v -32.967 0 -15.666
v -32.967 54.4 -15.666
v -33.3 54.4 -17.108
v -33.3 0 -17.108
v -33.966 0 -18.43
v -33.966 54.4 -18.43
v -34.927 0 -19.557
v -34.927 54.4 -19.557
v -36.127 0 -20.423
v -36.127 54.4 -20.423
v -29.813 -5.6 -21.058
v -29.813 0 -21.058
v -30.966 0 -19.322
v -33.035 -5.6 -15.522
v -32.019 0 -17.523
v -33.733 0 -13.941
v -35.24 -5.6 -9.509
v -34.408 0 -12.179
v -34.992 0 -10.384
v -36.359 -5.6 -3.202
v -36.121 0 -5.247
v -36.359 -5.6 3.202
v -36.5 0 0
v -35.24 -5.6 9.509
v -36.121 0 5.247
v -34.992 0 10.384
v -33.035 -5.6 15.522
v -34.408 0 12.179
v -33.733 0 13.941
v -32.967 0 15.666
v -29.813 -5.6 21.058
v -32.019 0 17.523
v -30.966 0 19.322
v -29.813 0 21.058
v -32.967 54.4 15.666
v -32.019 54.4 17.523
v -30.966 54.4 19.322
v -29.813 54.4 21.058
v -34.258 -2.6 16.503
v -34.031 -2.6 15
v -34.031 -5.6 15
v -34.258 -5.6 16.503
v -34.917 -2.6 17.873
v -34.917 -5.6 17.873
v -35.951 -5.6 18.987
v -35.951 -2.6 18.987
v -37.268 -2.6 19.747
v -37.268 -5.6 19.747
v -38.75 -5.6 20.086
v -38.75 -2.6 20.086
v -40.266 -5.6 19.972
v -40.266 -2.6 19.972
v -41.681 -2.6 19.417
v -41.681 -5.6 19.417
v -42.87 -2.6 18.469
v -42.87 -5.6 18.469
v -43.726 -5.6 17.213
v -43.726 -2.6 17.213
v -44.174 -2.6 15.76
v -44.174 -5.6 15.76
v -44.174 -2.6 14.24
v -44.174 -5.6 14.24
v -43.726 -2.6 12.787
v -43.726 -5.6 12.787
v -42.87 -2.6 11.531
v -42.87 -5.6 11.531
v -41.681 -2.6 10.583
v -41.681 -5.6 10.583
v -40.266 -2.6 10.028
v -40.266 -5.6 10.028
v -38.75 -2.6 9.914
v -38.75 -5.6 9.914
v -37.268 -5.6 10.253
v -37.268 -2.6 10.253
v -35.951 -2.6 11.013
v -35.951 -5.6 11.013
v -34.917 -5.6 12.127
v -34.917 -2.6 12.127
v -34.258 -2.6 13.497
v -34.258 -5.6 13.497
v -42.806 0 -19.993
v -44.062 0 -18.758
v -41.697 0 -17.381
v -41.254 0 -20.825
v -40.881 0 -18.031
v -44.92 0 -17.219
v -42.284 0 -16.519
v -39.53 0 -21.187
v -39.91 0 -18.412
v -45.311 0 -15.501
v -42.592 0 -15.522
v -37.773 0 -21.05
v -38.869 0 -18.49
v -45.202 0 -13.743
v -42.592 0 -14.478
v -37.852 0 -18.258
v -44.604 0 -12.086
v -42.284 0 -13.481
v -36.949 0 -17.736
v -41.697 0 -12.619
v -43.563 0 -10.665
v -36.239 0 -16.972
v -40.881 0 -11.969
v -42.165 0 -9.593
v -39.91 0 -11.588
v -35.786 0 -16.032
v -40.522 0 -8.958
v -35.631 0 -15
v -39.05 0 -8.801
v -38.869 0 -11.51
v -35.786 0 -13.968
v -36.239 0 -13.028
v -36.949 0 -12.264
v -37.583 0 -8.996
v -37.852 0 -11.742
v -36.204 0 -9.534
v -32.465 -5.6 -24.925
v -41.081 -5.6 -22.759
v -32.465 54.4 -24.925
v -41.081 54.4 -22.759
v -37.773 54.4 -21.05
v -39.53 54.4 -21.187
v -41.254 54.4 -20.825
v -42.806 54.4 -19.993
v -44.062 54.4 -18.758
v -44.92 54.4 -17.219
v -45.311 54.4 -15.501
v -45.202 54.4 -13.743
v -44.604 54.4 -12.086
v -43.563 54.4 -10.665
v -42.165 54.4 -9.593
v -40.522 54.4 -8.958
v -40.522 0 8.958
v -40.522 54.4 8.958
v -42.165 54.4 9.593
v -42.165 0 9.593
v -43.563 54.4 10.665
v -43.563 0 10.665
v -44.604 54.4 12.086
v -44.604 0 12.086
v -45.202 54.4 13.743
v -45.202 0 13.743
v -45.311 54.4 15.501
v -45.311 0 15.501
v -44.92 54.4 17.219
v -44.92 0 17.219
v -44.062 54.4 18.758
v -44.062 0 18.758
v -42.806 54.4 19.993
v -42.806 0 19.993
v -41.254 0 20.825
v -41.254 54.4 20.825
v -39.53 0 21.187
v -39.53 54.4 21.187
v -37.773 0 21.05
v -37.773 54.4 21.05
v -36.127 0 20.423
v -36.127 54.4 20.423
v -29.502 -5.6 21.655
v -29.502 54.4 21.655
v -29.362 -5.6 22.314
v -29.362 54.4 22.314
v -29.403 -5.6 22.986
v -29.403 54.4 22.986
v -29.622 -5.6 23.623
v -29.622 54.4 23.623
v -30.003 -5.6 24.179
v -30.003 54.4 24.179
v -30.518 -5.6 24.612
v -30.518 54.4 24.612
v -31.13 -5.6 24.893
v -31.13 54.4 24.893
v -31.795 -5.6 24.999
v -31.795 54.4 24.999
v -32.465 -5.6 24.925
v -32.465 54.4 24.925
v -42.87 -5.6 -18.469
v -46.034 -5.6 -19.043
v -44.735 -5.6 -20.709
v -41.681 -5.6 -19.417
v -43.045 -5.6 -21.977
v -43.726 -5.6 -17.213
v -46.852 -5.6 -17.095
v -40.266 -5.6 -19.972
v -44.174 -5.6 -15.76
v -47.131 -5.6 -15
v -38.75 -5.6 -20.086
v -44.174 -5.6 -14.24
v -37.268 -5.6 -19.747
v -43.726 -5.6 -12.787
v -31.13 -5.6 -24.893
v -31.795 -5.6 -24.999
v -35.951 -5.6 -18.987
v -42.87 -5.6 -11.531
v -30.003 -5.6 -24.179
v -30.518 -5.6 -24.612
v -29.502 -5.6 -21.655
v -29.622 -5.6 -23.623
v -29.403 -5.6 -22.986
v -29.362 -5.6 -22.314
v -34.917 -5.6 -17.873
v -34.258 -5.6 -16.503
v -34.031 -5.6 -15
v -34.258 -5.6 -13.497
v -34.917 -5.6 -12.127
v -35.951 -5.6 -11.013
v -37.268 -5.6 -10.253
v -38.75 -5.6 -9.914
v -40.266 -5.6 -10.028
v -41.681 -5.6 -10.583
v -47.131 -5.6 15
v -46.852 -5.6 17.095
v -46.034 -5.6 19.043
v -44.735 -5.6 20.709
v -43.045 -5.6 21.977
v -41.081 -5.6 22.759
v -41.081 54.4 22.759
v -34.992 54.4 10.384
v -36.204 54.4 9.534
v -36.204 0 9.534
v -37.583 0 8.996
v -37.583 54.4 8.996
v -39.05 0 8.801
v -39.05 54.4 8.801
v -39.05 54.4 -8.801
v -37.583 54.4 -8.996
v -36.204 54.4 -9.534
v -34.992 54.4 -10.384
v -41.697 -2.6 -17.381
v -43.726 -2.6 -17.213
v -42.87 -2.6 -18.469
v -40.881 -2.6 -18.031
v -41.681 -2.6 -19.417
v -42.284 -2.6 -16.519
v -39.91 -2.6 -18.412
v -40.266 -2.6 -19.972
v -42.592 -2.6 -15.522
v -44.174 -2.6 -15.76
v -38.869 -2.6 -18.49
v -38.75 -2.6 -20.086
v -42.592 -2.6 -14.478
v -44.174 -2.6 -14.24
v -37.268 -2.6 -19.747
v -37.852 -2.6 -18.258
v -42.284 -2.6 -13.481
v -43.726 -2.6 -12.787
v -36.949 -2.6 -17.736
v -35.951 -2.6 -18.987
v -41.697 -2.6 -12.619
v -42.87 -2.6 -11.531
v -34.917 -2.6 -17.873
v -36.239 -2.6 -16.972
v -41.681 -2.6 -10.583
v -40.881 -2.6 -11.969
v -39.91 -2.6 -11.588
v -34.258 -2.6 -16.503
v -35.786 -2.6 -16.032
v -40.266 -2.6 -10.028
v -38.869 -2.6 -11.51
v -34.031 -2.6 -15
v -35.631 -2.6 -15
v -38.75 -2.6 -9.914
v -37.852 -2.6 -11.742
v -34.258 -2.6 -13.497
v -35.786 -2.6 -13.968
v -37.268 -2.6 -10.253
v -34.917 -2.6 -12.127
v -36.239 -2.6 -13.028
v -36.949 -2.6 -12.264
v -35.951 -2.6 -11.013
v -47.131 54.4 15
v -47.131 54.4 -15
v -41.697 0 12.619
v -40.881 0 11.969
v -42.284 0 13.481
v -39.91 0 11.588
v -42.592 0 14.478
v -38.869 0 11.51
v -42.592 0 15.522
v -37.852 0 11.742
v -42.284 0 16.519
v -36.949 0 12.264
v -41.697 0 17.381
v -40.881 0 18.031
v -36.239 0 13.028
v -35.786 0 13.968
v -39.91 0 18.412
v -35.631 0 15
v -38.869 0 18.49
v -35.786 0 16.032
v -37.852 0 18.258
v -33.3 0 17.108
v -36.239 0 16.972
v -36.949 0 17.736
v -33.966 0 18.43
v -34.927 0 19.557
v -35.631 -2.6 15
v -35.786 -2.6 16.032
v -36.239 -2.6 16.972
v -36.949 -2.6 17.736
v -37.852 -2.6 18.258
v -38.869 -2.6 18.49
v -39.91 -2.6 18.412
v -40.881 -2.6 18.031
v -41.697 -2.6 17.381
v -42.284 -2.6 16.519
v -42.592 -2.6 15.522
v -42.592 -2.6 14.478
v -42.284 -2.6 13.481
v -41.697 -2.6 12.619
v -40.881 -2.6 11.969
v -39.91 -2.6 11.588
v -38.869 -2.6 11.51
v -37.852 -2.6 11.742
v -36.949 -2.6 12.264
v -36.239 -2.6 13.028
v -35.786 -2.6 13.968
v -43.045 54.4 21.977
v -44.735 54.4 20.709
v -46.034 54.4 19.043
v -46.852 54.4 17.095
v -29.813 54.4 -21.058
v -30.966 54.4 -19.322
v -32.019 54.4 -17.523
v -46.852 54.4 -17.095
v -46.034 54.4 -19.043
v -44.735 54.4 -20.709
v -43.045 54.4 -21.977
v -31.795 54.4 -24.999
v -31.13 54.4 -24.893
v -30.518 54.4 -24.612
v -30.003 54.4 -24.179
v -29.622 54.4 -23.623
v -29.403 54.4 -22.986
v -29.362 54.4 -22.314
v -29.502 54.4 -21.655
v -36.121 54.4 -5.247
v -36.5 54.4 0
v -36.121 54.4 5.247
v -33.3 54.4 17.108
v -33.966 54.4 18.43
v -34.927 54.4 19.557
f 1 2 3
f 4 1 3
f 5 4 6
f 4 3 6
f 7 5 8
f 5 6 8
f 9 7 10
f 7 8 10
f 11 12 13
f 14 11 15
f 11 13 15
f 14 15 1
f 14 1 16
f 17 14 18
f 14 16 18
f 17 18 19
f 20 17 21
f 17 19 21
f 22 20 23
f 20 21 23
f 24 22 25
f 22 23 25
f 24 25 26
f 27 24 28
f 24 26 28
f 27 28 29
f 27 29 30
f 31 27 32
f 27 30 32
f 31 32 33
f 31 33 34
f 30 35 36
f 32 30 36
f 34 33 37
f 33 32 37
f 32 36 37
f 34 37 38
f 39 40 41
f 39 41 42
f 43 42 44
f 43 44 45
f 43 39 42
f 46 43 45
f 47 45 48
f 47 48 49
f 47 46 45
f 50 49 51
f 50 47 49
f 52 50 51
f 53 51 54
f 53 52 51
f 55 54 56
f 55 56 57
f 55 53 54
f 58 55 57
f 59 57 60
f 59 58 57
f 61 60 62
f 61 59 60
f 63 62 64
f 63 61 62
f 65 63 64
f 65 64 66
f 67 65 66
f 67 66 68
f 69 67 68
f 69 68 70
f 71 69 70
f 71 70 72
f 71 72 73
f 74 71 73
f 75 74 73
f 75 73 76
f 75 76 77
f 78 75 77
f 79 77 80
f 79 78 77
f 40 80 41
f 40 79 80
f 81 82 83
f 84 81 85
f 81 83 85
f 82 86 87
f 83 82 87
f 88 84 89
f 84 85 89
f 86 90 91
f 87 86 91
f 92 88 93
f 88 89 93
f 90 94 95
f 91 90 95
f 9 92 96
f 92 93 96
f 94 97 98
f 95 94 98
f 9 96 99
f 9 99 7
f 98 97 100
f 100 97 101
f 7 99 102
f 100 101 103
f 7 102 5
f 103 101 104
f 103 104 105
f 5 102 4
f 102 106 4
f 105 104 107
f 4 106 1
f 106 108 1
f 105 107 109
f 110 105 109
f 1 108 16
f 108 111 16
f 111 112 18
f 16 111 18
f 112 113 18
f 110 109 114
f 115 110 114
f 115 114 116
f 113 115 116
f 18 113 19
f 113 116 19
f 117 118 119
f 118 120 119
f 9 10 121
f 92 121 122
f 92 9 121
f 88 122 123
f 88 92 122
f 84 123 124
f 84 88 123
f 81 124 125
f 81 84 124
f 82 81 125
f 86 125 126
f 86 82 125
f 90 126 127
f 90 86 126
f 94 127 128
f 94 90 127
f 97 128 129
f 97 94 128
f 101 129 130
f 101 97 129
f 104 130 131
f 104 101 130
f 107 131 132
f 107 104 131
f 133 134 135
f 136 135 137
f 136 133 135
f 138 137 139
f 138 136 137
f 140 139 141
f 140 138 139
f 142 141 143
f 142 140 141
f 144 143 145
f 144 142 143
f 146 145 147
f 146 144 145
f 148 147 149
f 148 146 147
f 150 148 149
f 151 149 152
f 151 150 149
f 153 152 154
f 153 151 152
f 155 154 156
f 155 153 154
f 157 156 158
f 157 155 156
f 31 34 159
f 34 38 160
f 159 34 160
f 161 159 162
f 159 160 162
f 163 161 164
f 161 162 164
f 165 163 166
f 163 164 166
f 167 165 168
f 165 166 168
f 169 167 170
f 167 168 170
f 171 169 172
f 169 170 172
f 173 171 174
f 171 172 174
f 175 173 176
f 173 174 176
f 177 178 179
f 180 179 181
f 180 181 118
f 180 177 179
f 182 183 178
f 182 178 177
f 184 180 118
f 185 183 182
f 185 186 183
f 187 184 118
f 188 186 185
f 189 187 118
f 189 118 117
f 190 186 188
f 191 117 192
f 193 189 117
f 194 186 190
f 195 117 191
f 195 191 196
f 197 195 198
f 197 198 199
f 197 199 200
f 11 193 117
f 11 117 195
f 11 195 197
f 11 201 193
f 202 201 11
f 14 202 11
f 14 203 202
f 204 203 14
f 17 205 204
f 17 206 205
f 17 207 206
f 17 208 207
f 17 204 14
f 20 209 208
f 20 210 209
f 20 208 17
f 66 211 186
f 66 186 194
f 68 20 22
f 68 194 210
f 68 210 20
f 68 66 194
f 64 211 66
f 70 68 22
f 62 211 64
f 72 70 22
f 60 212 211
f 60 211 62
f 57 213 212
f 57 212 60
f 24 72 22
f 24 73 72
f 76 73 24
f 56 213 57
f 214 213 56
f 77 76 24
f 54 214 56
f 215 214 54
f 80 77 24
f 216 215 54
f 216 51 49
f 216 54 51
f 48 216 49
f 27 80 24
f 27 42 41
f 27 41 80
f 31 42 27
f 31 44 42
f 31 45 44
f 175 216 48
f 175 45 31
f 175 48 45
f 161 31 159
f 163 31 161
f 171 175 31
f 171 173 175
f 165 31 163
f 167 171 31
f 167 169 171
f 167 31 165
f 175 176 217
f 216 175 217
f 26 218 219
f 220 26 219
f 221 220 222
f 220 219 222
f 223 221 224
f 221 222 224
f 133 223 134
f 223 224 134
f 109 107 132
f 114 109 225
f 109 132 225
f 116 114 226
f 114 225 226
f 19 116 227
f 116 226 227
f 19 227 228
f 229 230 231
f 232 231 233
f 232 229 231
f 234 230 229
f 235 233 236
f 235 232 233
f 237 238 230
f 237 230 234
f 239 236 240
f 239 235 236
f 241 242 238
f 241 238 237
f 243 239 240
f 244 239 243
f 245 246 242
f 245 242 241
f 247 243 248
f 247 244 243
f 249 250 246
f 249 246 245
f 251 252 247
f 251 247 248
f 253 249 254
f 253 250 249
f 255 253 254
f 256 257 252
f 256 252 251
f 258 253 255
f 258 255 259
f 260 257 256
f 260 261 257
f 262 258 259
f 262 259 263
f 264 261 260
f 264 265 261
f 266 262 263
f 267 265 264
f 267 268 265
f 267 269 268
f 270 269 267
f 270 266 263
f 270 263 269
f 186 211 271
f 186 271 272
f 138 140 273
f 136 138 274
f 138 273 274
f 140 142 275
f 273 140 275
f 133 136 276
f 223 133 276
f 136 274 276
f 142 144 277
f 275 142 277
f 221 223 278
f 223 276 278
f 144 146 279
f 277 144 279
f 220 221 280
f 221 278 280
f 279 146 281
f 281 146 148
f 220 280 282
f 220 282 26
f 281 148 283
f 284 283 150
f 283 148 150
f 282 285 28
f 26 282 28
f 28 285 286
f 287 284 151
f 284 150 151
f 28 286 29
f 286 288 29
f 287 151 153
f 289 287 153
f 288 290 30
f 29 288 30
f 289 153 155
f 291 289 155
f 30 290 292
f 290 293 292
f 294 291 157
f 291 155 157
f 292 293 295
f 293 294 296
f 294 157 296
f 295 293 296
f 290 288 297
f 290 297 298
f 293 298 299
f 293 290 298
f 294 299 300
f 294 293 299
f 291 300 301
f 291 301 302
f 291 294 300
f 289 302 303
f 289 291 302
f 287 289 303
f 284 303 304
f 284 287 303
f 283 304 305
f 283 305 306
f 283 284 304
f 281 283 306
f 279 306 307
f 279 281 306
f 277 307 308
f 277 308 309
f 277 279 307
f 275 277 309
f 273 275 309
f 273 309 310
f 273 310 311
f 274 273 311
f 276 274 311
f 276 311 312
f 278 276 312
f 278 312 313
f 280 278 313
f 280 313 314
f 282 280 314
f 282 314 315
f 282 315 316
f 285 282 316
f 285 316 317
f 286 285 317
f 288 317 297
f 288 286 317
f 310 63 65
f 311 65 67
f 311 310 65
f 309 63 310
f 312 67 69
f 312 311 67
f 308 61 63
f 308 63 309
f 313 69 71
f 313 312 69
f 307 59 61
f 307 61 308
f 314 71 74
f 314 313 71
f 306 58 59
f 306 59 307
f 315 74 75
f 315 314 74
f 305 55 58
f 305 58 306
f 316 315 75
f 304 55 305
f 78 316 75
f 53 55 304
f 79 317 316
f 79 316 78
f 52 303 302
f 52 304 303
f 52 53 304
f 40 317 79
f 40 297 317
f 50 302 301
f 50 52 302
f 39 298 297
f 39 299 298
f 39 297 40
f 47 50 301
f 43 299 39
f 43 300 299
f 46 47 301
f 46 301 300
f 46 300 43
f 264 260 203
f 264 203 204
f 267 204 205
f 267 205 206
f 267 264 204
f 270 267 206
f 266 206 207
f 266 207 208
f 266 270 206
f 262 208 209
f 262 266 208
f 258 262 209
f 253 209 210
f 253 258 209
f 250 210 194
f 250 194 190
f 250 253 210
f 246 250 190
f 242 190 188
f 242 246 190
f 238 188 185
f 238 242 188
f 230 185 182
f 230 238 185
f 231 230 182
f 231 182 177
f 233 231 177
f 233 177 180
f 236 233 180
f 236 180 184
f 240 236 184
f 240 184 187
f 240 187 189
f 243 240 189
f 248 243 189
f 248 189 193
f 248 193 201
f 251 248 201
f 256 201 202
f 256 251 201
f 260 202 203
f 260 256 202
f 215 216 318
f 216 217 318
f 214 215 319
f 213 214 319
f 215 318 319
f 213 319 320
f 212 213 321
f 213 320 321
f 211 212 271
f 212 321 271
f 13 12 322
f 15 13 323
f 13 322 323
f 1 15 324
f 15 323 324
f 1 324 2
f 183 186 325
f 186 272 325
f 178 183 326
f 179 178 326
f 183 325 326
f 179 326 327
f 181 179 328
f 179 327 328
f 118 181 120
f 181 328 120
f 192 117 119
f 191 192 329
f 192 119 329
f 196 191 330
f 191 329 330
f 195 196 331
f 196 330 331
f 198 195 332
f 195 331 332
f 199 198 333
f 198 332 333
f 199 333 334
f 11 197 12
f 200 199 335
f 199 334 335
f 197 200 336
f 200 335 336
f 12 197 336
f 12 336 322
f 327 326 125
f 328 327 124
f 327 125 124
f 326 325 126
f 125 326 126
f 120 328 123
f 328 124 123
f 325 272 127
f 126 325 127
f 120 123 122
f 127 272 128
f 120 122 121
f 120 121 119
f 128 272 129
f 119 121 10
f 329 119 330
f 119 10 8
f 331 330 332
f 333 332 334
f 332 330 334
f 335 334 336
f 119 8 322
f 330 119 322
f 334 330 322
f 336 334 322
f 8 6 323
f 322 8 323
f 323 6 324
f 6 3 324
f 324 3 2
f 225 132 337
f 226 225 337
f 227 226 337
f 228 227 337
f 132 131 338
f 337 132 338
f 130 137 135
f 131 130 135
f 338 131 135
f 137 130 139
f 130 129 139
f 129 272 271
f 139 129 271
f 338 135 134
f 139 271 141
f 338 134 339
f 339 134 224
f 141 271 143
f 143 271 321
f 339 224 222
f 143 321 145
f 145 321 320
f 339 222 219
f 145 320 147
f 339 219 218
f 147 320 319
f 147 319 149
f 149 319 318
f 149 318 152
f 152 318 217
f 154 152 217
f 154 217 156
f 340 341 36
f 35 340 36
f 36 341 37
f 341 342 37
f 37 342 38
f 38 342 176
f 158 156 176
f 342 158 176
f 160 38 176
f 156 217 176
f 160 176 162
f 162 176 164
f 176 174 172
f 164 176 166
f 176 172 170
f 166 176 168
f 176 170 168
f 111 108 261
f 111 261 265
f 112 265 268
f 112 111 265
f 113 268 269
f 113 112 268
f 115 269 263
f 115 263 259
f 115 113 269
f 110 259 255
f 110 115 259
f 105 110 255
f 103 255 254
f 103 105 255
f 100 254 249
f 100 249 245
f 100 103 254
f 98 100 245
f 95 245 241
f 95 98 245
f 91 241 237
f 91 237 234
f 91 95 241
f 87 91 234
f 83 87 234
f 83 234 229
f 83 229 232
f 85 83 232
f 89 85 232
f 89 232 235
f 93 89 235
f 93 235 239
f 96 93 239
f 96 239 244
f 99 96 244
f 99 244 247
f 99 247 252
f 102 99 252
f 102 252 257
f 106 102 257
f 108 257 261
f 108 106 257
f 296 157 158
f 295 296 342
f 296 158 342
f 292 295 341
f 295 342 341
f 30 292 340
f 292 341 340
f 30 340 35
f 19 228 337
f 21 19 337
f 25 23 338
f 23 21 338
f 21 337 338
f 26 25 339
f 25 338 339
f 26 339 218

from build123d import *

# Parameters (mm, degrees)
BOSS_EXTRU_1_DEPTH      = 54.4
ESQUISSE2_R             = 6.2
ENL_V_MAT_EXTRU_1_DEPTH = 55.4
BOSS_EXTRU_2_DEPTH      = 54.4
ESQUISSE4_R             = 3.5
BOSS_EXTRU_3_DEPTH      = 2.6
ESQUISSE5_R             = 5.1
BOSS_EXTRU_4_DEPTH      = 3


with BuildPart() as part:
    # Esquisse1 → Boss.-Extru.1 (new body)
    with BuildSketch(Plane(origin=(0, 0, 0), x_dir=(1, 0, 0), z_dir=(0, 1, 0))):
        with BuildLine():
            ThreePointArc((-33.897137082, 23.942307692), (-41.5, 0), (-33.897137082, -23.942307692))
            ThreePointArc((-33.897137082, -23.942307692), (-30.41283318, -24.54199621), (-29.813144663, -21.057692308))
            ThreePointArc((-29.813144663, -21.057692308), (-36.5, 0), (-29.813144663, 21.057692308))
            ThreePointArc((-29.813144663, 21.057692308), (-30.41283318, 24.54199621), (-33.897137082, 23.942307692))
        make_face()
    extrude(amount=BOSS_EXTRU_1_DEPTH)

    # Esquisse2 → Enlèv. mat.-Extru.1 (cut, through all)
    with BuildSketch(Plane(origin=(0, 54.4, 0), x_dir=(1, 0, 0), z_dir=(0, 1, 0))):
        with Locations((-39.130938787, 15)):
            Circle(ESQUISSE2_R)
        with Locations((-39.130938787, -15)):
            Circle(ESQUISSE2_R)
    extrude(amount=-ENL_V_MAT_EXTRU_1_DEPTH, mode=Mode.SUBTRACT)

    # Esquisse3 → Boss.-Extru.2 (add)
    with BuildSketch(Plane.XZ):
        with BuildLine():
            Line((-47.130938787, 15), (-47.130938787, -15))
            ThreePointArc((-47.130938787, -15), (-45.439748727, -19.919239489), (-41.081209501, -22.758636745))
            Line((-41.081209501, -22.758636745), (-32.46460047, -24.924573983))
            ThreePointArc((-32.46460047, -24.924573983), (-29.793288851, -23.913777296), (-29.813144663, -21.057692308))
            ThreePointArc((-29.813144663, -21.057692308), (-31.505533615, -18.429632433), (-32.966857258, -15.666407455))
            ThreePointArc((-32.966857258, -15.666407455), (-44.920174268, -17.219178351), (-34.991734648, -10.384050575))
            ThreePointArc((-34.991734648, -10.384050575), (-36.5, 0), (-34.991734648, 10.384050575))
            ThreePointArc((-34.991734648, 10.384050575), (-44.920174268, 17.219178351), (-32.966857258, 15.666407455))
            ThreePointArc((-32.966857258, 15.666407455), (-31.505533615, 18.429632433), (-29.813144663, 21.057692308))
            ThreePointArc((-29.813144663, 21.057692308), (-29.793288851, 23.913777296), (-32.46460047, 24.924573983))
            Line((-32.46460047, 24.924573983), (-41.081209501, 22.758636745))
            ThreePointArc((-41.081209501, 22.758636745), (-45.439748727, 19.919239489), (-47.130938787, 15))
        make_face()
    extrude(amount=-BOSS_EXTRU_2_DEPTH)

    # Esquisse4 → Boss.-Extru.3 (add)
    with BuildSketch(Plane.XZ):
        with BuildLine():
            Line((-47.130938787, 15), (-47.130938787, -15))
            ThreePointArc((-47.130938787, -15), (-45.439748727, -19.919239489), (-41.081209501, -22.758636745))
            Line((-41.081209501, -22.758636745), (-32.46460047, -24.924573983))
            ThreePointArc((-32.46460047, -24.924573983), (-29.793288851, -23.913777296), (-29.813144663, -21.057692308))
            ThreePointArc((-29.813144663, -21.057692308), (-36.5, 0), (-29.813144663, 21.057692308))
            ThreePointArc((-29.813144663, 21.057692308), (-29.793288851, 23.913777296), (-32.46460047, 24.924573983))
            Line((-32.46460047, 24.924573983), (-41.081209501, 22.758636745))
            ThreePointArc((-41.081209501, 22.758636745), (-45.439748727, 19.919239489), (-47.130938787, 15))
        make_face()
        with Locations((-39.130938787, 15)):
            Circle(ESQUISSE4_R, mode=Mode.SUBTRACT)
        with Locations((-39.130938787, -15)):
            Circle(ESQUISSE4_R, mode=Mode.SUBTRACT)
    extrude(amount=BOSS_EXTRU_3_DEPTH)

    # Esquisse5 → Boss.-Extru.4 (add)
    with BuildSketch(Plane.XZ.offset(2.6)):
        with BuildLine():
            Line((-32.46460047, 24.924573983), (-41.081209501, 22.758636745))
            ThreePointArc((-41.081209501, 22.758636745), (-45.439748727, 19.919239489), (-47.130938787, 15))
            Line((-47.130938787, 15), (-47.130938787, -15))
            ThreePointArc((-47.130938787, -15), (-45.439748727, -19.919239489), (-41.081209501, -22.758636745))
            Line((-41.081209501, -22.758636745), (-32.46460047, -24.924573983))
            ThreePointArc((-32.46460047, -24.924573983), (-29.793288851, -23.913777296), (-29.813144663, -21.057692308))
            ThreePointArc((-29.813144663, -21.057692308), (-36.5, 0), (-29.813144663, 21.057692308))
            ThreePointArc((-29.813144663, 21.057692308), (-29.793288851, 23.913777296), (-32.46460047, 24.924573983))
        make_face()
        with Locations((-39.130938787, 15)):
            Circle(ESQUISSE5_R, mode=Mode.SUBTRACT)
        with Locations((-39.130938787, -15)):
            Circle(ESQUISSE5_R, mode=Mode.SUBTRACT)
    extrude(amount=BOSS_EXTRU_4_DEPTH)


solid = part.part
